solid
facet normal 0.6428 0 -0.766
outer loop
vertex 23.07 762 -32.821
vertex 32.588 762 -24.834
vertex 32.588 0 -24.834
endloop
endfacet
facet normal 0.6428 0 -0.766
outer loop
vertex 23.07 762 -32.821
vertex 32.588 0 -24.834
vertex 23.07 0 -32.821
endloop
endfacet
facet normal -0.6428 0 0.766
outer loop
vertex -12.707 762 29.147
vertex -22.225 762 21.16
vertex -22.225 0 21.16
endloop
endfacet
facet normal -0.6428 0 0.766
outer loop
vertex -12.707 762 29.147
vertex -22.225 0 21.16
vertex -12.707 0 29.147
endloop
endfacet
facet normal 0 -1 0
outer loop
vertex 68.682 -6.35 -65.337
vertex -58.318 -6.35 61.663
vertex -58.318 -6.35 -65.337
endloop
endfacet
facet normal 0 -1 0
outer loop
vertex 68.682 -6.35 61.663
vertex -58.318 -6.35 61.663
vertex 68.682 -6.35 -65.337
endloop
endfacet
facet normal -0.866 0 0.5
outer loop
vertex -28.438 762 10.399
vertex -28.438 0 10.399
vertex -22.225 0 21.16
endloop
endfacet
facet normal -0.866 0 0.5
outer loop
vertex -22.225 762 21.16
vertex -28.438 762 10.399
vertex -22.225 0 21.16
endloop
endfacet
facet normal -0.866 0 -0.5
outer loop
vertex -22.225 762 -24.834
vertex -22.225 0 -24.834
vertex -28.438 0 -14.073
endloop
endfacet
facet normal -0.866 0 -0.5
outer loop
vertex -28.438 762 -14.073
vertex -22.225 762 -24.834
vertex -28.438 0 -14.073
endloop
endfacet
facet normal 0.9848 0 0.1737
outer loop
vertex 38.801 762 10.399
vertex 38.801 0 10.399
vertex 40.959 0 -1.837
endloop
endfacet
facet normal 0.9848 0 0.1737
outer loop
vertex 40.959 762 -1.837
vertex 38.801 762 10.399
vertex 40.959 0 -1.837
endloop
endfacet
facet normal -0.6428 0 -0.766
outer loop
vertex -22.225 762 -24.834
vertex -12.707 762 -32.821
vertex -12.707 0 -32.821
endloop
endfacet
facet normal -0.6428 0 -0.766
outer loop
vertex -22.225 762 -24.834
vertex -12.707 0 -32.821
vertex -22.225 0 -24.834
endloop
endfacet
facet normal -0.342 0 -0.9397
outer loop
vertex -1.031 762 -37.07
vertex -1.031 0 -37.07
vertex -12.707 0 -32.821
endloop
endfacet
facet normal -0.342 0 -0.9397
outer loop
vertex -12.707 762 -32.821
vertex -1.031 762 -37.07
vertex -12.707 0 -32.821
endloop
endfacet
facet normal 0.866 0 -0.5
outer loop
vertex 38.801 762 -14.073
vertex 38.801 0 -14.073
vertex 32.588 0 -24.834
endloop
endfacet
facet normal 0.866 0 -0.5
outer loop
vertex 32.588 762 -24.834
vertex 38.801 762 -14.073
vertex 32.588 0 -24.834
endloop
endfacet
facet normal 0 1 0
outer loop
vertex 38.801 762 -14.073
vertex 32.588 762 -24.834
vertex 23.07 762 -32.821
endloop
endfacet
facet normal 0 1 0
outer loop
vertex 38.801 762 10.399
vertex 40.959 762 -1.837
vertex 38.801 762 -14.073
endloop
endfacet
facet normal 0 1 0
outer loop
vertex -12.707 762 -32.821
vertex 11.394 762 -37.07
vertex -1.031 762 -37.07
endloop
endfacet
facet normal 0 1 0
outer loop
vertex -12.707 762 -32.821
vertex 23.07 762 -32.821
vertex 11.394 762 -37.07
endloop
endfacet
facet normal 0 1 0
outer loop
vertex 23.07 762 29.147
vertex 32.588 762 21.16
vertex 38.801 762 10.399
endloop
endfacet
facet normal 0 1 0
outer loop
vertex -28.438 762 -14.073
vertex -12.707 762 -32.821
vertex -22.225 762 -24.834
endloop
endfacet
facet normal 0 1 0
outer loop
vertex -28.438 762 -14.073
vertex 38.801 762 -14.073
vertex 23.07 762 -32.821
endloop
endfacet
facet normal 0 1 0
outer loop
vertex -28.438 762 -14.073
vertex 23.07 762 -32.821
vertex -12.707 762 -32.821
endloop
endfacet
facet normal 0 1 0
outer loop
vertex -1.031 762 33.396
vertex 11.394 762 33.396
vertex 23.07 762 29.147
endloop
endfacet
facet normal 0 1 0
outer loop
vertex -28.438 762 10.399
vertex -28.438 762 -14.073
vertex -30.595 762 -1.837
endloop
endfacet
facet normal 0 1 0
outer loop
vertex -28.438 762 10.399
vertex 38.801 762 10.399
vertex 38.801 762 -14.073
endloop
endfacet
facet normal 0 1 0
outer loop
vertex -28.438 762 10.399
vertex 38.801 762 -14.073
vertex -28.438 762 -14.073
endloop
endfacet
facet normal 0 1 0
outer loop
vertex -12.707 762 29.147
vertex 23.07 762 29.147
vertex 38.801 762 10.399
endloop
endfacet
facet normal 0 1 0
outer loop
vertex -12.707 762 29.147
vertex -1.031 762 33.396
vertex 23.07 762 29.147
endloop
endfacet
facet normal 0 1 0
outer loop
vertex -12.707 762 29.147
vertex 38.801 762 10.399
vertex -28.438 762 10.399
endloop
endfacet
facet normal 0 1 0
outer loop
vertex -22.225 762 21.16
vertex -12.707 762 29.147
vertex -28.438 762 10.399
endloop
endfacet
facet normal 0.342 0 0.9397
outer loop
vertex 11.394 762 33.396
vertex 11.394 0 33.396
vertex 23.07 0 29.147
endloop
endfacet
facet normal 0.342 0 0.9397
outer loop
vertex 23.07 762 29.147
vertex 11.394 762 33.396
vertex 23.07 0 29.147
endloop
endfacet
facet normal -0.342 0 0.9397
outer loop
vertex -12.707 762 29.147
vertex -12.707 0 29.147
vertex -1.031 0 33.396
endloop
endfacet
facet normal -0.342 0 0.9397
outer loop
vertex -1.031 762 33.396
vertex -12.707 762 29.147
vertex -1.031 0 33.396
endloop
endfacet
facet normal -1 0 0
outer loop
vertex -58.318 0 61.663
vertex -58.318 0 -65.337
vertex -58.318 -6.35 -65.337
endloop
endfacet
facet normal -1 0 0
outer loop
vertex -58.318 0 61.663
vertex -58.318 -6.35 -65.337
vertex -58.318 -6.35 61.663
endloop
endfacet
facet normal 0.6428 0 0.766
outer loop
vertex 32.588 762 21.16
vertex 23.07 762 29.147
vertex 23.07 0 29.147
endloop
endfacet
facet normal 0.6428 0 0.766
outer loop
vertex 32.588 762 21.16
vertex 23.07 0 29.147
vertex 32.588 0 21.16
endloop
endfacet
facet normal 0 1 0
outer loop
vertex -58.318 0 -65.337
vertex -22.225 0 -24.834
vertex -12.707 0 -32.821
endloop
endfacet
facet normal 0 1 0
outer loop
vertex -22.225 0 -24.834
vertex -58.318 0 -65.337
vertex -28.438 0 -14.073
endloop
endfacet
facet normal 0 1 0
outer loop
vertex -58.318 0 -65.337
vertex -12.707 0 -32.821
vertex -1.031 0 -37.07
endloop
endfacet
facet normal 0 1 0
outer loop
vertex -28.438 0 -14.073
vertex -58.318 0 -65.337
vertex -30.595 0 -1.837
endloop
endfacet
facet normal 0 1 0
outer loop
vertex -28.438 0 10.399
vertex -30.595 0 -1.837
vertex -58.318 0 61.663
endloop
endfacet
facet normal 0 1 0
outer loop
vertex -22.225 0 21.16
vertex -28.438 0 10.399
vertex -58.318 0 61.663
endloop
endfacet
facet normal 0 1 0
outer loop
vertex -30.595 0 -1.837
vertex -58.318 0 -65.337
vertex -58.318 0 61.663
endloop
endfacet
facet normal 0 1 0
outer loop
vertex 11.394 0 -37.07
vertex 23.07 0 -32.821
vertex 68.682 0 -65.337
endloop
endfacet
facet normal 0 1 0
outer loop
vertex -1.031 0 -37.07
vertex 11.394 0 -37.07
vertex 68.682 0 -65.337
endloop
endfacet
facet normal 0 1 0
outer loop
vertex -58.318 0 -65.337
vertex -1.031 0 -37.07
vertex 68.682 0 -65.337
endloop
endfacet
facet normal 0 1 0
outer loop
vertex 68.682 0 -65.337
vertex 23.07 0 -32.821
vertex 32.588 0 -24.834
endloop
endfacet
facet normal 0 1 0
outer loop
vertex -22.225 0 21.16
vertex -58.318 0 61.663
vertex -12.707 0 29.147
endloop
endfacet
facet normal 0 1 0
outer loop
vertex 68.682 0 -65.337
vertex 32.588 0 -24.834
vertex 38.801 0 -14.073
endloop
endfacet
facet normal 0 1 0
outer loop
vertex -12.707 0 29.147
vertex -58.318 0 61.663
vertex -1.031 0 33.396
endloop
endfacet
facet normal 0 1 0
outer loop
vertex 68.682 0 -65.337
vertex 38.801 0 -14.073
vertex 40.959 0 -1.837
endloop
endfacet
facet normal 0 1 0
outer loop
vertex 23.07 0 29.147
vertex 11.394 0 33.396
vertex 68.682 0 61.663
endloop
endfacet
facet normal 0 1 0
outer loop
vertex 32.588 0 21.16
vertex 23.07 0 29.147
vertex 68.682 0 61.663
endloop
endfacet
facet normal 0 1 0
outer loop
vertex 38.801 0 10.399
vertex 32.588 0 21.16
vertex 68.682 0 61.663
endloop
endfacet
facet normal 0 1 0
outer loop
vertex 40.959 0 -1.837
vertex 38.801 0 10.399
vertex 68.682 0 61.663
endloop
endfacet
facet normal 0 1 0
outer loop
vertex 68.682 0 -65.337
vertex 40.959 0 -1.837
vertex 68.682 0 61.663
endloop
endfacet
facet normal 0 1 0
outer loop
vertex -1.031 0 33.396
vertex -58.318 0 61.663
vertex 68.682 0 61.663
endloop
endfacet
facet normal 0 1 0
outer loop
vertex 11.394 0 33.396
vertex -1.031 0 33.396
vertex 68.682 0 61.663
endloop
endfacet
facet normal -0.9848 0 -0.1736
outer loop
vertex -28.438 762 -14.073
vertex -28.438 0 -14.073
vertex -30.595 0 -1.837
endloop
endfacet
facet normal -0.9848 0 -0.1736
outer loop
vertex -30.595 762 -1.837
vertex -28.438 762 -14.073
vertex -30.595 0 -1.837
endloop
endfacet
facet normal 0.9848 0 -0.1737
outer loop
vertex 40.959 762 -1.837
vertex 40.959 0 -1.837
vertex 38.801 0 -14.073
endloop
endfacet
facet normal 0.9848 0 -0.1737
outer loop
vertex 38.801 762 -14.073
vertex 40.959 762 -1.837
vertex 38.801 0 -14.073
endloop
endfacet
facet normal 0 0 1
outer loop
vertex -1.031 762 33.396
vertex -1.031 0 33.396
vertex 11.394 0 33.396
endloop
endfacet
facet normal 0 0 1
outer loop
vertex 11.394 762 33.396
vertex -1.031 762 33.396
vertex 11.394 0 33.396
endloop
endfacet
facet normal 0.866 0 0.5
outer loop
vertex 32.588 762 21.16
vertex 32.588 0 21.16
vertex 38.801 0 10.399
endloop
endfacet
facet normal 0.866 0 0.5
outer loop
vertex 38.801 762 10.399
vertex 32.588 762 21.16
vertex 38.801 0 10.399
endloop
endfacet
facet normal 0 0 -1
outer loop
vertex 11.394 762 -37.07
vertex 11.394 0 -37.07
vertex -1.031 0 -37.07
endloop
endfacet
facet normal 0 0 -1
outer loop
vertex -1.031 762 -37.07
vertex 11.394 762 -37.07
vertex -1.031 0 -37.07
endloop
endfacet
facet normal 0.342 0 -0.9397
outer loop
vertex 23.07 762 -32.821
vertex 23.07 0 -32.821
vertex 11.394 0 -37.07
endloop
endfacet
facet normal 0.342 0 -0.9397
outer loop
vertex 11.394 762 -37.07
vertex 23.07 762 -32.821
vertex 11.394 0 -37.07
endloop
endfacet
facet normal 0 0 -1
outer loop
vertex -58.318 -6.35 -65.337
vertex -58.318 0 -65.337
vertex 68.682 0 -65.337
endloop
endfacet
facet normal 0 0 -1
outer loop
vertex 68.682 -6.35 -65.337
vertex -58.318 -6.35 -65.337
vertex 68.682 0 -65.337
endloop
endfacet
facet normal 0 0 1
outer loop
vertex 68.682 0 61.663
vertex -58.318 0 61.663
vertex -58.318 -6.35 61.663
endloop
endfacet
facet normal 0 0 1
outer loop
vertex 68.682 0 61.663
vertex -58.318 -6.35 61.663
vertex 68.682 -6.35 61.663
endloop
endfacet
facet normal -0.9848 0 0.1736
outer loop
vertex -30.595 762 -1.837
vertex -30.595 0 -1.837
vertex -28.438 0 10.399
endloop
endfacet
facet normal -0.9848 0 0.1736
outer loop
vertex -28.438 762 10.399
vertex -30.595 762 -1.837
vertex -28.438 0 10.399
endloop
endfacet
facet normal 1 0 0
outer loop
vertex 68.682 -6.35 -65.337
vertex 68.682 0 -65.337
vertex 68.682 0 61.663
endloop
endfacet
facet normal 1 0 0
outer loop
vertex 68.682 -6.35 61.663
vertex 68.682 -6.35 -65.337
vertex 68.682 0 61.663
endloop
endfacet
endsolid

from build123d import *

# Parameters (mm, degrees)
F0_W     = 127
F0_H     = 127
F1_DEPTH = 6.35
F4_DEPTH = 762


with BuildPart() as f1:
    # F0 (on Front) → F1 (new body)
    with BuildSketch(Plane.XZ):
        with Locations((5.181599, -1.836989)):
            Rectangle(F0_W, F0_H)
    extrude(amount=F1_DEPTH)

    # F3 (on face) → F4 (join)
    with BuildSketch(Plane(origin=(0, 0, 0), x_dir=(-1, 0, 0), z_dir=(0, 1, 0))):
        Polygon((-11.394211, -37.070461), (1.031012, -37.070461), (12.706903, -32.820784), (22.225176, -24.834005), (28.437787, -14.073446), (30.595405, -1.836989), (28.437787, 10.399467), (22.225176, 21.160026), (12.706903, 29.146805), (1.031012, 33.396482), (-11.394211, 33.396482), (-23.070102, 29.146805), (-32.588375, 21.160026), (-38.800986, 10.399467), (-40.958604, -1.836989), (-38.800986, -14.073446), (-32.588375, -24.834005), (-23.070102, -32.820784), align=None)
    extrude(amount=F4_DEPTH)


solid = f1.part
